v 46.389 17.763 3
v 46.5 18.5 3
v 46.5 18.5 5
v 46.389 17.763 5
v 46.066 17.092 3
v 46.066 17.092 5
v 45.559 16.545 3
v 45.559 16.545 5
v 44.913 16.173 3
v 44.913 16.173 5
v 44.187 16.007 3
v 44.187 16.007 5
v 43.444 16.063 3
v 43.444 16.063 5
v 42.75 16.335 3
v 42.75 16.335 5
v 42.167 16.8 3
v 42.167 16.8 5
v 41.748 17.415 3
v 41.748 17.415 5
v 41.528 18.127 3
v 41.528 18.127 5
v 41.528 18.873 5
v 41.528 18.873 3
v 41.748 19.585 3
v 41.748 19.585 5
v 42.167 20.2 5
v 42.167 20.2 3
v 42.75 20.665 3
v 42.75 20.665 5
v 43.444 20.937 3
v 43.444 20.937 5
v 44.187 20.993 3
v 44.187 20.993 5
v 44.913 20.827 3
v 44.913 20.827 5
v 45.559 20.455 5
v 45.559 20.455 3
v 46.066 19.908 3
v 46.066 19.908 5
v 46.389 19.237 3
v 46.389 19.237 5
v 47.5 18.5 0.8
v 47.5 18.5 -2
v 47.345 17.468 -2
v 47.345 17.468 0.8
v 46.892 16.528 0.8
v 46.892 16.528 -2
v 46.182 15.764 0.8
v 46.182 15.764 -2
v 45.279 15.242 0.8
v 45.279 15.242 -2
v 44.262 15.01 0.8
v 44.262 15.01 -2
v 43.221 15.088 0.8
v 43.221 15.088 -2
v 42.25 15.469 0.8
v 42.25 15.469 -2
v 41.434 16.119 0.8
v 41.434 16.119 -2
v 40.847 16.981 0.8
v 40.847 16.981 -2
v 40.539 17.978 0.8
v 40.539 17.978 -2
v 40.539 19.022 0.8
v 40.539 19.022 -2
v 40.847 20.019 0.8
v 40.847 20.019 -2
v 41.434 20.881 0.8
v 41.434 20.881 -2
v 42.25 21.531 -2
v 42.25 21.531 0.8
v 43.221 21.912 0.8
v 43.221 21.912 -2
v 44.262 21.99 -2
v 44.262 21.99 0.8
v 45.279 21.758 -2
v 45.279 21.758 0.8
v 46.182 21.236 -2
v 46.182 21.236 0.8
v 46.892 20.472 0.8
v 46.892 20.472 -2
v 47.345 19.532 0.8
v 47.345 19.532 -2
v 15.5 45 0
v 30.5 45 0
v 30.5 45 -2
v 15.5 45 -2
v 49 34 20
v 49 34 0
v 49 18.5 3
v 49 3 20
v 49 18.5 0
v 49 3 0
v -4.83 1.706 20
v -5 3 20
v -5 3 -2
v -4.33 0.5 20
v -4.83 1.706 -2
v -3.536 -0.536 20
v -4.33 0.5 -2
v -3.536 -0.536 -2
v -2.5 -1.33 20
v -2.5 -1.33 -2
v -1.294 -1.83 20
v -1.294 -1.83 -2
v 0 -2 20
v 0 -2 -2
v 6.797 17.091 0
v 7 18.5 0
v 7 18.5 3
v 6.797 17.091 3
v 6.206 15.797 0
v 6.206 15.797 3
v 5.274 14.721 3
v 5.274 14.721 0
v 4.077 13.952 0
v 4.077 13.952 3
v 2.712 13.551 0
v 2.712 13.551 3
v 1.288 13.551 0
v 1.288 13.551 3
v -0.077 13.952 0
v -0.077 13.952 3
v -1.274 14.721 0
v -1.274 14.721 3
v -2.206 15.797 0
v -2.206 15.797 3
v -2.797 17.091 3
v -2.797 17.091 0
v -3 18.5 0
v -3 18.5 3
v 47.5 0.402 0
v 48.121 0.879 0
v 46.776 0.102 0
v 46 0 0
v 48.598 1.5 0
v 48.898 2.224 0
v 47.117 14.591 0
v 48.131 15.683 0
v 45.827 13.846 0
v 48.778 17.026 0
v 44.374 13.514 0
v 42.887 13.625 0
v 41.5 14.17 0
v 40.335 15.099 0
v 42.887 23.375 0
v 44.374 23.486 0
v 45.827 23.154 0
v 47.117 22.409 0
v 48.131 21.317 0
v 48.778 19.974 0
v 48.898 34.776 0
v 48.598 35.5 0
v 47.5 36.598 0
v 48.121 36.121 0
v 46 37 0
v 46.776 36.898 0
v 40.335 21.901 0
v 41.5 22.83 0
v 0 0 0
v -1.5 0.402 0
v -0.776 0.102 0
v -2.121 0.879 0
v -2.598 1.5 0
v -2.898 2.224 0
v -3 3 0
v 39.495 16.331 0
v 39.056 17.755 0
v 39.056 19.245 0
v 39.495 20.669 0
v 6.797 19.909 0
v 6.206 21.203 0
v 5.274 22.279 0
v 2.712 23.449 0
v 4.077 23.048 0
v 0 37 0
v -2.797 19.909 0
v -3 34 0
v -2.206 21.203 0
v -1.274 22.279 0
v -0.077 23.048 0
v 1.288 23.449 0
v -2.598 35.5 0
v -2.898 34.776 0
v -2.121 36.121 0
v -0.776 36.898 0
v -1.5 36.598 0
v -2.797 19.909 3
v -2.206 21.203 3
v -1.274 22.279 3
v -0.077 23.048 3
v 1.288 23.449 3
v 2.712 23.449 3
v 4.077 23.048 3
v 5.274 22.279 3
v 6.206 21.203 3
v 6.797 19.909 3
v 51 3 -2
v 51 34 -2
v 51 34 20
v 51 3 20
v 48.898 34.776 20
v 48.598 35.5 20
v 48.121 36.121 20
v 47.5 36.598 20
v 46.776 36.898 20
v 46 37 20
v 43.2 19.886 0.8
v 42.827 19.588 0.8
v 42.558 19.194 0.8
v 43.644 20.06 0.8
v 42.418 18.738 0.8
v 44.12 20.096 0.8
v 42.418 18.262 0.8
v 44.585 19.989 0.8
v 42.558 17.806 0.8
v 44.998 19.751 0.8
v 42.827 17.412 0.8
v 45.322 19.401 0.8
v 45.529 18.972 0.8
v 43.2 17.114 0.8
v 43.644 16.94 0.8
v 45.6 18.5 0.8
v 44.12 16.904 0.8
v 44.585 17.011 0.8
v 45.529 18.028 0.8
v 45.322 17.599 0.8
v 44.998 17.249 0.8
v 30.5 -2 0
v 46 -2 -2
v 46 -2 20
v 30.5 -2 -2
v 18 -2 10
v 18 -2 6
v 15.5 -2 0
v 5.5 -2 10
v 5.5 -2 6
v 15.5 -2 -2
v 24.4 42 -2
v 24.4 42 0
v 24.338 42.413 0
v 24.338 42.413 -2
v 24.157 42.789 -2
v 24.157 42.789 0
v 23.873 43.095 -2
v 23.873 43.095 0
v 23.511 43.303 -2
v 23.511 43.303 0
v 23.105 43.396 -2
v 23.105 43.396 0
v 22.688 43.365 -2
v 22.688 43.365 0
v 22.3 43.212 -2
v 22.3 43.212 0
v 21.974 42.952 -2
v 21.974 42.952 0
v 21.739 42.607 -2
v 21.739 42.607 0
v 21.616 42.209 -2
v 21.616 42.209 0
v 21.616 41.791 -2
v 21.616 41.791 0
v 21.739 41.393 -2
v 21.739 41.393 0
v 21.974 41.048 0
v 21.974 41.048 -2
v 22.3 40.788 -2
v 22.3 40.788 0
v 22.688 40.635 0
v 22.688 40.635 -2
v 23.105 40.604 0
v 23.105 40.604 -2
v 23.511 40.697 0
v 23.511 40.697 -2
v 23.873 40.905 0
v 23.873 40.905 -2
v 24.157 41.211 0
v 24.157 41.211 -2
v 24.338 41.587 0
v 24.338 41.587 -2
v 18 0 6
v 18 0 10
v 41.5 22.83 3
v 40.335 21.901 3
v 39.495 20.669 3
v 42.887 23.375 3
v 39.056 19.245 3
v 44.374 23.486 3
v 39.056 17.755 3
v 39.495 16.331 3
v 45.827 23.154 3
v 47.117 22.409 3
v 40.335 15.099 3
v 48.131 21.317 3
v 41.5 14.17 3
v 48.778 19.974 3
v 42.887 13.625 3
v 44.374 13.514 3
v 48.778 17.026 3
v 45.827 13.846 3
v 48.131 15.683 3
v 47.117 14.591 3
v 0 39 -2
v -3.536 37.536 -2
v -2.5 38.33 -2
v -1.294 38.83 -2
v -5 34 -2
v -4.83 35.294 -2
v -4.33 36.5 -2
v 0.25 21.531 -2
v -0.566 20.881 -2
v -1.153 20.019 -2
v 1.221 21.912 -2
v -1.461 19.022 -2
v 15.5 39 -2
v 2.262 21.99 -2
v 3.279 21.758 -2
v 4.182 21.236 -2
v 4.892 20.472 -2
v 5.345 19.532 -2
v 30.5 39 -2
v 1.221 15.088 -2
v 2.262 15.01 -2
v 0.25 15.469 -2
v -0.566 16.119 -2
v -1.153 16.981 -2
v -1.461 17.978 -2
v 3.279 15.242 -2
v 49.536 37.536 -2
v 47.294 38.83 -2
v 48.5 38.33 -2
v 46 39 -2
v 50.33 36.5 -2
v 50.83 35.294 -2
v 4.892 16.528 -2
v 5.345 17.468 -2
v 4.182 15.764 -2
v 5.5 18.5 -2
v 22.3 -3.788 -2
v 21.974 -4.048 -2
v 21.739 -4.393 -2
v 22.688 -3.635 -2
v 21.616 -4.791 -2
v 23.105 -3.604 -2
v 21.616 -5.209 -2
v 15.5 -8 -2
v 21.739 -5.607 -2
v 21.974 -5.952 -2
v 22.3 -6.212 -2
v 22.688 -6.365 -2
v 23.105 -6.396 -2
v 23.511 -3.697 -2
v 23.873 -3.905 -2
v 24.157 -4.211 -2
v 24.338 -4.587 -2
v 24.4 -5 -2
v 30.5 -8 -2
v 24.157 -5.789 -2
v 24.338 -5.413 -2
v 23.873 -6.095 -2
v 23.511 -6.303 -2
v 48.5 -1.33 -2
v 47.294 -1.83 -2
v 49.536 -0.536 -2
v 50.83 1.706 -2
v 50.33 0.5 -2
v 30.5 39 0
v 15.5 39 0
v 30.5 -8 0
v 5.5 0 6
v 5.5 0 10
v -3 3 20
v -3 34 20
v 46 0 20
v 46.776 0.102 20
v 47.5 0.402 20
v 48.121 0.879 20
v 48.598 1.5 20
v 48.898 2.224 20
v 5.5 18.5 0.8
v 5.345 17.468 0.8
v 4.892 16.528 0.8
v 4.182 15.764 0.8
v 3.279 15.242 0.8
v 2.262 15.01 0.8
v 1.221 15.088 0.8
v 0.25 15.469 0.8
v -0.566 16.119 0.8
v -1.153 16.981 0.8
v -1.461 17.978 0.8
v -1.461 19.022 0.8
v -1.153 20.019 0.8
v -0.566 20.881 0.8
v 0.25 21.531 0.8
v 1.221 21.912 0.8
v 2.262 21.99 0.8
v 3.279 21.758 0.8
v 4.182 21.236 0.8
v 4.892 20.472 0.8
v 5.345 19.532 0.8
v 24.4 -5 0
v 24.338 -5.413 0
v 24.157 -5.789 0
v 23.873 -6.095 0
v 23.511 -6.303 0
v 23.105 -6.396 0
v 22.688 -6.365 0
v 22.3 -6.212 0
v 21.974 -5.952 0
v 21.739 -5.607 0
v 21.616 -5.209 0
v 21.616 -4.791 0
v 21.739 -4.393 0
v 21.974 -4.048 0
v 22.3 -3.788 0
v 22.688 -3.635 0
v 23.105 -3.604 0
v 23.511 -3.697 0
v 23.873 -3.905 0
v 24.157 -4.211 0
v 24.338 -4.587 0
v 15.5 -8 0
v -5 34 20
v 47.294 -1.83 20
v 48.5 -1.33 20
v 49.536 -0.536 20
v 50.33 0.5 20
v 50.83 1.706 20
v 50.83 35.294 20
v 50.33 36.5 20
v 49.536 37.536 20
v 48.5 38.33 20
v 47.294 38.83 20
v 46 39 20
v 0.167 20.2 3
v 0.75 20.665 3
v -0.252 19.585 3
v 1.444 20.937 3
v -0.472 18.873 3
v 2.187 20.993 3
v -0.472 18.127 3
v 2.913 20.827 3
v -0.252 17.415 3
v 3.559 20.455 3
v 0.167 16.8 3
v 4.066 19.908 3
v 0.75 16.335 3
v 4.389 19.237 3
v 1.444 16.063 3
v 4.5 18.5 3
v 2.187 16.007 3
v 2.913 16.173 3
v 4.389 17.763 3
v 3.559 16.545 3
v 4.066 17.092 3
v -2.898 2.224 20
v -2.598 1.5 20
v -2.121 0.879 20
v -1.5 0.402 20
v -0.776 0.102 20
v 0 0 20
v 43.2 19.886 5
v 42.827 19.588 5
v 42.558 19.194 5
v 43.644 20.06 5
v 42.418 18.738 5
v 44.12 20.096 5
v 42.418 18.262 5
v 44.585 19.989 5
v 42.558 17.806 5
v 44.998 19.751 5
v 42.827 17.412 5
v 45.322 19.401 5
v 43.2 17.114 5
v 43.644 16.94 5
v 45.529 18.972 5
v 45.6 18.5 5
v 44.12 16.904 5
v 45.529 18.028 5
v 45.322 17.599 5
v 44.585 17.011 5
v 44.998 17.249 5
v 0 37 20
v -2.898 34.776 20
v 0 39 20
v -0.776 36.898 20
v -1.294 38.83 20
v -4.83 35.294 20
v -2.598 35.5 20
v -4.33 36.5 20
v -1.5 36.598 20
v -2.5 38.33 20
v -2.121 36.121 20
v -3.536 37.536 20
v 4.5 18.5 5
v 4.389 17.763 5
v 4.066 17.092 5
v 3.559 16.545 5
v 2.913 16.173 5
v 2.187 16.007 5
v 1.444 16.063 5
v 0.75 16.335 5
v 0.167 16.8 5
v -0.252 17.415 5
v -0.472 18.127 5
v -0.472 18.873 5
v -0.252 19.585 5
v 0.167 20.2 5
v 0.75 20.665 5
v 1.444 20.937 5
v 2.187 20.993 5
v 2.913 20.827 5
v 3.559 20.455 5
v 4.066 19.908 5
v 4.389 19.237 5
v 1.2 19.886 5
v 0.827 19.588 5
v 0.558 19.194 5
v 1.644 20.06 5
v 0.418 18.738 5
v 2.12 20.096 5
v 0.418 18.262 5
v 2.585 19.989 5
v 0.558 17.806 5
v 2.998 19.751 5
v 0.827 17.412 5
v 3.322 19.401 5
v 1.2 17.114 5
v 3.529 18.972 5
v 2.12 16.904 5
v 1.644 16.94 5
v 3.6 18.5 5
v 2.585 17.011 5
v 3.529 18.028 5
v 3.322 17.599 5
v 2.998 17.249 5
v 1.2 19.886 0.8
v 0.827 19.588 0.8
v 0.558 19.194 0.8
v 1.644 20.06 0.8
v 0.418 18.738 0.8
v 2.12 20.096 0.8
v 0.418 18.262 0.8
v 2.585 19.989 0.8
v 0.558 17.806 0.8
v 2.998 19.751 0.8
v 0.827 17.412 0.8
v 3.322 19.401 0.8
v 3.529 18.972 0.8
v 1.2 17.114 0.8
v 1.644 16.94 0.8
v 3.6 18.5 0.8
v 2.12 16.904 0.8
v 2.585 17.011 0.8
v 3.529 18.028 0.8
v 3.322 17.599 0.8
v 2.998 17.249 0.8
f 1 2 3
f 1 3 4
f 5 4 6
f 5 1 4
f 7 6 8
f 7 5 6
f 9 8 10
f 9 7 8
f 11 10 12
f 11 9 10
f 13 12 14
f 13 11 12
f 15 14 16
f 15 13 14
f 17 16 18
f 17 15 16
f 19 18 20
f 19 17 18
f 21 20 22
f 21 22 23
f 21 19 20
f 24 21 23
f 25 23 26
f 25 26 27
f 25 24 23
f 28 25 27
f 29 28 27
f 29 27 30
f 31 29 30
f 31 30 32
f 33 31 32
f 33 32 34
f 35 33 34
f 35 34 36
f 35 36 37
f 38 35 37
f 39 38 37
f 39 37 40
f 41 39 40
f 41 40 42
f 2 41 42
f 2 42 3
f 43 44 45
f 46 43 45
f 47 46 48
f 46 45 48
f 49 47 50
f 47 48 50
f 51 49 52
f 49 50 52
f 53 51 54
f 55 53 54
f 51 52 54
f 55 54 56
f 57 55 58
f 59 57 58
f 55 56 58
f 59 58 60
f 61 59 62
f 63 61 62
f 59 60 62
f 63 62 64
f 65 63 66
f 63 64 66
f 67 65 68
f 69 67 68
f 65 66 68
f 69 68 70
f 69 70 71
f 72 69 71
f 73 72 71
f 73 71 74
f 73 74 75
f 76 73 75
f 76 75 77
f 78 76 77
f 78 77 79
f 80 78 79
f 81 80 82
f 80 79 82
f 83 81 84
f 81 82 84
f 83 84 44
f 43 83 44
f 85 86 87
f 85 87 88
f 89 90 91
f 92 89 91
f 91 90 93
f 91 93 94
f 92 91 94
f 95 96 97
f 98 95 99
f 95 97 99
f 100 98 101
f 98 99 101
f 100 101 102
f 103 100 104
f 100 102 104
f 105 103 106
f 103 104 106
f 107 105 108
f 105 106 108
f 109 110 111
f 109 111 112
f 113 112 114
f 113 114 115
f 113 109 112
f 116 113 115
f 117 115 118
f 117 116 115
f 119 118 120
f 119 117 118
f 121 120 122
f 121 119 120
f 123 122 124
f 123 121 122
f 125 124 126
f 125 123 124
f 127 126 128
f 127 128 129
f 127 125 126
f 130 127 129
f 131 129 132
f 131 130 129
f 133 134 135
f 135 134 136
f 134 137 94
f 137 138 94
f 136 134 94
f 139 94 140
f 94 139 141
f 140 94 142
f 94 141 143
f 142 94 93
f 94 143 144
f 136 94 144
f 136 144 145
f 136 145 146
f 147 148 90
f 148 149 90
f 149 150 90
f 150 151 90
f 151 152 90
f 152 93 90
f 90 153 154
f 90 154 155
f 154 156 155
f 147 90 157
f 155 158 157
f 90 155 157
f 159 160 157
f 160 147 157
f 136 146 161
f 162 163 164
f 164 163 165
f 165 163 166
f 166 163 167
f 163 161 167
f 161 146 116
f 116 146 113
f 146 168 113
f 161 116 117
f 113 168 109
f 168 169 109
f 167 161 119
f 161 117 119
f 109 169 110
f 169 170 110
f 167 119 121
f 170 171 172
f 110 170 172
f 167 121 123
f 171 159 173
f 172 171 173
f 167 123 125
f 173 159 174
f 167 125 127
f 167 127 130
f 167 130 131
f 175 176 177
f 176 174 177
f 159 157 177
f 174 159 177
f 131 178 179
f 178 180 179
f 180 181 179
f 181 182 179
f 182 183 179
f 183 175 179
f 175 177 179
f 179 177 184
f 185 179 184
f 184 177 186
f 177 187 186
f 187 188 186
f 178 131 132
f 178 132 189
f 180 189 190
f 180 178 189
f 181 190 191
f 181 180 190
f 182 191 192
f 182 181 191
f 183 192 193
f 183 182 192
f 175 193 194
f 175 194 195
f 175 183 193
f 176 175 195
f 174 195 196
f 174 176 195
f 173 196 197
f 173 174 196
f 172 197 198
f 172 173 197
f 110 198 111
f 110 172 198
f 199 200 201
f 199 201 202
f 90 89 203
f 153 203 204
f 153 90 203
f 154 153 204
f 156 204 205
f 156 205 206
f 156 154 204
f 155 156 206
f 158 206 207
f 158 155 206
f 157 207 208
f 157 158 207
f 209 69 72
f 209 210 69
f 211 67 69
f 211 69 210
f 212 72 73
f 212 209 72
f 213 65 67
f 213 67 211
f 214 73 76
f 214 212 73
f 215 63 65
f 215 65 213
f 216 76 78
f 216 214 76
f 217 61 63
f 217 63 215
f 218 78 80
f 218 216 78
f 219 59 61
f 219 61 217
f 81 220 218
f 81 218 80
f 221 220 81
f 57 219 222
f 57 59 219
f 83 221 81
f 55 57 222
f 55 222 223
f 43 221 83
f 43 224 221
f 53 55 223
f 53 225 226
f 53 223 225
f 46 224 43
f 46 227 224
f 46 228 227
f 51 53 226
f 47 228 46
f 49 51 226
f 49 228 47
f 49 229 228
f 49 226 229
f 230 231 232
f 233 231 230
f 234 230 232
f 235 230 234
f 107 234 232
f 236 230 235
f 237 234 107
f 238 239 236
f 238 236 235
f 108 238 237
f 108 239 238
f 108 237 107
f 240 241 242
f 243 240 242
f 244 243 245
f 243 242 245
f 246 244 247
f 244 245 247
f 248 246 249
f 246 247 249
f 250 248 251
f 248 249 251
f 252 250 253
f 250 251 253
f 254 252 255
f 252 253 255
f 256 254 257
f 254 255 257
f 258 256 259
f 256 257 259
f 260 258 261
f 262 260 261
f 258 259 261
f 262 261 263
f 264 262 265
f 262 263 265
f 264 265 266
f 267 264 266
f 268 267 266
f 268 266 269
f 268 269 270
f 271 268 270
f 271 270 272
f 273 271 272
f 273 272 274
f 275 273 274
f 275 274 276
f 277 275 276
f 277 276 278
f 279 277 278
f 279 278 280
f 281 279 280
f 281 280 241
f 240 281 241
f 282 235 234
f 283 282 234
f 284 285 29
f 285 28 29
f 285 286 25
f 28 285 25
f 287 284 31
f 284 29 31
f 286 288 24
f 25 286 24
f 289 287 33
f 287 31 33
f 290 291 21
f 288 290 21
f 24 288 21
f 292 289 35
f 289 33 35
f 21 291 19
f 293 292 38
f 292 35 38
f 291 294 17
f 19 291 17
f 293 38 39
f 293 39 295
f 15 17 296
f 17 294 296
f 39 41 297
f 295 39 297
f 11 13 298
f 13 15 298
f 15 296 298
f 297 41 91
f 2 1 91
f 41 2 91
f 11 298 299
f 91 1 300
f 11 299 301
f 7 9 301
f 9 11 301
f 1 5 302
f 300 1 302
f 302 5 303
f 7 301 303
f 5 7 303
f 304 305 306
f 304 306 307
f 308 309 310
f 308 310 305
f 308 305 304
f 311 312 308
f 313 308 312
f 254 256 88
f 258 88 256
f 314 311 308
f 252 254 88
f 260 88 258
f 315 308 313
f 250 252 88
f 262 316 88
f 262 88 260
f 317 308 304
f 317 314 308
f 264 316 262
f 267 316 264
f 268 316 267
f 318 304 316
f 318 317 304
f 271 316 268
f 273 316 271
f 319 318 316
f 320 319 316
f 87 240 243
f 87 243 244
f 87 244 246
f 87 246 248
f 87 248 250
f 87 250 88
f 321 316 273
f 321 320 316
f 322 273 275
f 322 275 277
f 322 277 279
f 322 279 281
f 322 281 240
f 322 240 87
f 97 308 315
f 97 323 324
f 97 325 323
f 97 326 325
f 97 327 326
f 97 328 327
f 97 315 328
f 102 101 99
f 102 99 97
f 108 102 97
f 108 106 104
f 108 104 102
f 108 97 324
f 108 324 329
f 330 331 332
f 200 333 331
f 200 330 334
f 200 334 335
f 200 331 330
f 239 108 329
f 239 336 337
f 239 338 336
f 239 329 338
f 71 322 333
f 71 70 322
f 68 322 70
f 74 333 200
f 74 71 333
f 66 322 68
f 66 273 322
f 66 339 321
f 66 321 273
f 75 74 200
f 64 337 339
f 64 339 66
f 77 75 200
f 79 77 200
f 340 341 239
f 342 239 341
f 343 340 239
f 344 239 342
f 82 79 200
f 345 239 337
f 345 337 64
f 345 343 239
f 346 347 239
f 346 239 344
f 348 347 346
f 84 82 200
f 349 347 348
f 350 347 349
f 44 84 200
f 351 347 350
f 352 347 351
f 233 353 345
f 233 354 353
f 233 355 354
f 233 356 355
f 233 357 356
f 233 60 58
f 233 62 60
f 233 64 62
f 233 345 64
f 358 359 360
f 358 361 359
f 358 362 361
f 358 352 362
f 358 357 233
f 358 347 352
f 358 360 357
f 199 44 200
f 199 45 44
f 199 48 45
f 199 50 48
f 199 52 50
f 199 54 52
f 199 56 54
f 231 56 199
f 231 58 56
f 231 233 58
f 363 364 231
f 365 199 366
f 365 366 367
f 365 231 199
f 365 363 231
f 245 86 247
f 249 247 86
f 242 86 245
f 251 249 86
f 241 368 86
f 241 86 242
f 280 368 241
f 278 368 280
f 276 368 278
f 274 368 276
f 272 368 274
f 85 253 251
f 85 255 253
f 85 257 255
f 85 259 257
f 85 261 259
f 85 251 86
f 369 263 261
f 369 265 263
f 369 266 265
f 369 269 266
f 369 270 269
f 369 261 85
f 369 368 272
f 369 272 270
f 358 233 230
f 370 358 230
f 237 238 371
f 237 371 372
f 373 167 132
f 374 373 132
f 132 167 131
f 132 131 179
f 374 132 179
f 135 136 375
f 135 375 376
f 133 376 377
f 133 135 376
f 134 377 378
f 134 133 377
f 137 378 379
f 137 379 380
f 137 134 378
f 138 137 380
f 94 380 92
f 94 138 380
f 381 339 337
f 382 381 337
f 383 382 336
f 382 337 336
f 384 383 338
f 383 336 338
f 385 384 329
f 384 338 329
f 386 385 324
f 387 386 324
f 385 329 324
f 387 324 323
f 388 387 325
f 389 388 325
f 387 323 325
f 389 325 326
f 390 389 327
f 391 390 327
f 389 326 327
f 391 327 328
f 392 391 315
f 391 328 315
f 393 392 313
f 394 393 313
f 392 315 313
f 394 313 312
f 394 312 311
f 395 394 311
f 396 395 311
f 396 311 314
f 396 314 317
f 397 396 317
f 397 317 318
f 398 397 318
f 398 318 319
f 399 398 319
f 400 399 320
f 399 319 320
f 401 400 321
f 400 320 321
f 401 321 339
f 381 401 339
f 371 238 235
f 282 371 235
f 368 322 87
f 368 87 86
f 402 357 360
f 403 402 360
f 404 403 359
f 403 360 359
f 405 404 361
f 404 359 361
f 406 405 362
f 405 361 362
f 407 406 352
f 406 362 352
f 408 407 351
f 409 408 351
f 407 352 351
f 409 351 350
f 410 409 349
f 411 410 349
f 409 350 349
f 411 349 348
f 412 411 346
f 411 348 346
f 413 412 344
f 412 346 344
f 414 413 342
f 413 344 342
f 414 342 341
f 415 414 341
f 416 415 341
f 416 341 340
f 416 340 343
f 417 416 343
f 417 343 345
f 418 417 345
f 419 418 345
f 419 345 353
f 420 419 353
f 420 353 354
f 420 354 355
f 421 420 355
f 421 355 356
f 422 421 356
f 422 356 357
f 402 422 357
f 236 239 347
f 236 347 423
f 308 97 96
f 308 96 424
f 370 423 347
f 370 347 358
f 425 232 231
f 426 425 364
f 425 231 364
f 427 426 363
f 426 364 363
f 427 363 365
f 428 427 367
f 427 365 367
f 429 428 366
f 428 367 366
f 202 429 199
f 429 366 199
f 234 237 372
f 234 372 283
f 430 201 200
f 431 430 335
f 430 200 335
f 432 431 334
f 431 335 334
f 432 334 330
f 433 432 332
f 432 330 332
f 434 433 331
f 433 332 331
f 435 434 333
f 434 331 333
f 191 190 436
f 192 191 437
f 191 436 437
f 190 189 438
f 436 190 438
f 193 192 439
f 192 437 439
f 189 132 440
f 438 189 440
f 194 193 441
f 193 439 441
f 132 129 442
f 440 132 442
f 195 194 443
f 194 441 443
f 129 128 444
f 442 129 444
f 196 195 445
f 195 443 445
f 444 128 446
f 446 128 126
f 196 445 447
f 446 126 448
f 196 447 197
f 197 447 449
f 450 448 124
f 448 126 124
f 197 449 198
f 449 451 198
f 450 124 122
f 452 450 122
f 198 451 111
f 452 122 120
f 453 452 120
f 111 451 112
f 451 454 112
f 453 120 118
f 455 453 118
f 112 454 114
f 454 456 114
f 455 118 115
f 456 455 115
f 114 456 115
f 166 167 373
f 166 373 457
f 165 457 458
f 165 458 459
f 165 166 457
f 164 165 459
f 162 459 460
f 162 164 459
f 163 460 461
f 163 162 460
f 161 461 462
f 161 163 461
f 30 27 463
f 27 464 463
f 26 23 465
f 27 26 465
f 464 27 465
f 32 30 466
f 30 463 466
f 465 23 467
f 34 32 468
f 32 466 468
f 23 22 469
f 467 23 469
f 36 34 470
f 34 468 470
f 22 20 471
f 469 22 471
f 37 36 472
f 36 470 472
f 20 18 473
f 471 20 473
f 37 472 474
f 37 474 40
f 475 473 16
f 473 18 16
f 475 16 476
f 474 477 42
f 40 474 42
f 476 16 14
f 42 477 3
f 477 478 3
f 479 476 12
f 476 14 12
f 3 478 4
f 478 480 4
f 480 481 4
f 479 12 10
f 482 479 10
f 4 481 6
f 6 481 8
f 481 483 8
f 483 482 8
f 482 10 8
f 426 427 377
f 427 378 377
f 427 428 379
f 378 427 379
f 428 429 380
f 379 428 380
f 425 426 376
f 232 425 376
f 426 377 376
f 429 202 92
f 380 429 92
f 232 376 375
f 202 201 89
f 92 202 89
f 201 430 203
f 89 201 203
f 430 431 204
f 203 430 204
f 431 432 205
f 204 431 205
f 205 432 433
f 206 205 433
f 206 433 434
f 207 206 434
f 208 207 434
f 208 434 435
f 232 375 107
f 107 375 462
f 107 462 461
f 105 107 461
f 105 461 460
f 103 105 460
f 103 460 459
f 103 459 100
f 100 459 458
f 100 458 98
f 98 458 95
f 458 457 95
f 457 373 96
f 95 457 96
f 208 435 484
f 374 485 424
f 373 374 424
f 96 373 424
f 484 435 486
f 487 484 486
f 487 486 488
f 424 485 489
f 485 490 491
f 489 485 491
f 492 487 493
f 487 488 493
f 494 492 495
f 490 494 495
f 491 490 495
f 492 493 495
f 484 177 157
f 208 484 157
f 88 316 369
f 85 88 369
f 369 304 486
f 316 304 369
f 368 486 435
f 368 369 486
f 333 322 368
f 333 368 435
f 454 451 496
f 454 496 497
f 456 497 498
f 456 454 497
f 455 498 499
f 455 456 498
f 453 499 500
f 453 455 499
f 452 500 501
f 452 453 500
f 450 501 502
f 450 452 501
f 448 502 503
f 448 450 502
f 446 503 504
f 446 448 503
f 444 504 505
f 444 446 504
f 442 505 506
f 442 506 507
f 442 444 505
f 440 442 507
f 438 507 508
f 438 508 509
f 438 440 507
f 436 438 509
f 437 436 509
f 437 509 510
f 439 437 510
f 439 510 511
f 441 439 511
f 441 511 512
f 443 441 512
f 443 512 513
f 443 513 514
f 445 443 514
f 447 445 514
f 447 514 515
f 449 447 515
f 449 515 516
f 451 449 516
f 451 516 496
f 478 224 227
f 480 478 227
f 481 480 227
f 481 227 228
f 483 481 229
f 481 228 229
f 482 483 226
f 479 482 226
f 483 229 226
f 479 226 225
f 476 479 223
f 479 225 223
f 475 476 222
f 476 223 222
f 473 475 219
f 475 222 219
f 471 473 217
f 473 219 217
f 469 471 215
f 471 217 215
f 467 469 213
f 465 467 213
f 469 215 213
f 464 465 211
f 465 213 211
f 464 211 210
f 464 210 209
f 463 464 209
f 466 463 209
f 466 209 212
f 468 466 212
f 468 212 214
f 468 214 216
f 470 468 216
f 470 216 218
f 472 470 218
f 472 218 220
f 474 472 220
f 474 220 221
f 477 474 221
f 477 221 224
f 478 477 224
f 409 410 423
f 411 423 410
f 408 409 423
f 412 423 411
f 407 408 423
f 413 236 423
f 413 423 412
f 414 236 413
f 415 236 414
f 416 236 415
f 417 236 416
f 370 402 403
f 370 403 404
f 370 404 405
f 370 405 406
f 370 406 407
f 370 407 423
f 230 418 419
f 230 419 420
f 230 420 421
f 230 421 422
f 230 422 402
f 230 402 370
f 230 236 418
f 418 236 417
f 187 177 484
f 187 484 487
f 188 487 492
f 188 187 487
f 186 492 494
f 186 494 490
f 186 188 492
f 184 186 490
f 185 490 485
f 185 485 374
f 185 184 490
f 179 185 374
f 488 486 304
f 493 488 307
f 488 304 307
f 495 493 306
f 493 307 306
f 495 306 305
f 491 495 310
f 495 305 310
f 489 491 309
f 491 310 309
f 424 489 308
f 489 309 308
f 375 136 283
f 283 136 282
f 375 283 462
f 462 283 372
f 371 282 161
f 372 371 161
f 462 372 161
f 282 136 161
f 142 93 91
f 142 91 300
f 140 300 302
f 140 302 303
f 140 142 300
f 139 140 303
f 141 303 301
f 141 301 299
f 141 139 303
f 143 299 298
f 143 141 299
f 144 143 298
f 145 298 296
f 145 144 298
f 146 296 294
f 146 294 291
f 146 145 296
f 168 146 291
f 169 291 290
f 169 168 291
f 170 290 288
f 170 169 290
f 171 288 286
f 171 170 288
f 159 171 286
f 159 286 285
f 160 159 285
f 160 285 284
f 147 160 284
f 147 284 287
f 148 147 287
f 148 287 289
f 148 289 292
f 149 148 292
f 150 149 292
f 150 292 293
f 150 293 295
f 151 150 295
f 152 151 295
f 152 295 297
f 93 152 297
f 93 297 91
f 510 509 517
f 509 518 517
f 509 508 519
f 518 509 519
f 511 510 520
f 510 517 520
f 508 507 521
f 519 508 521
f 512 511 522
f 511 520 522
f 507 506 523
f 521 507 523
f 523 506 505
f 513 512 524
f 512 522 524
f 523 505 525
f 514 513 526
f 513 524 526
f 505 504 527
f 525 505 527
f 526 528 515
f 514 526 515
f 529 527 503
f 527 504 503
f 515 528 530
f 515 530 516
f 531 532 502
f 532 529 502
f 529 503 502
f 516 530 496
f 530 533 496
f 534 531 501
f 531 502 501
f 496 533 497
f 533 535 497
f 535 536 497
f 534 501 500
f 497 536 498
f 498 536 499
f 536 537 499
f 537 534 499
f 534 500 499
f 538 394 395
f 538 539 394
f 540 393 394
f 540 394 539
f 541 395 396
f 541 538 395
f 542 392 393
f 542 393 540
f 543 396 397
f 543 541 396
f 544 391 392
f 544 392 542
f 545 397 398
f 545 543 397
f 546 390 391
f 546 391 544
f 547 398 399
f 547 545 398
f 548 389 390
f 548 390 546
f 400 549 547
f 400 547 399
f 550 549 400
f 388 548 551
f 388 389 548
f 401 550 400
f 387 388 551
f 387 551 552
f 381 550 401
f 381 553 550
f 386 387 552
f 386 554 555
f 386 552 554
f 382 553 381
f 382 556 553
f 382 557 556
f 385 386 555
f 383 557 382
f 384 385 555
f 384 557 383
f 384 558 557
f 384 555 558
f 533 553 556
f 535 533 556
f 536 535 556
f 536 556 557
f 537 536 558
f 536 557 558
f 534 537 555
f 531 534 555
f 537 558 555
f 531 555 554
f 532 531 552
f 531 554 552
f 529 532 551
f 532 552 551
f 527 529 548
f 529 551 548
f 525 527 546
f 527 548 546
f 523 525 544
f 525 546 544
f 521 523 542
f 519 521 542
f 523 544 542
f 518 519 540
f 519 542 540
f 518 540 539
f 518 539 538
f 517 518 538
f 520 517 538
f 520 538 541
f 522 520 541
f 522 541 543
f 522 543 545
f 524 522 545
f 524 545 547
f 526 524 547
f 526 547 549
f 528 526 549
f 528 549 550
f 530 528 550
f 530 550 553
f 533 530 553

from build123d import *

# Parameters (mm, degrees)
PAD_DEPTH       = 20
THICKNESS_T     = 2
SKETCH001_W     = 15
SKETCH001_H     = 2
PAD001_DEPTH    = 6
SKETCH002_R     = 1.4
POCKET_DEPTH    = 2.001
SKETCH003_W     = 15
SKETCH003_H     = 2
PAD002_DEPTH    = 6
SKETCH004_R     = 1.4
POCKET001_DEPTH = 22.001
SKETCH005_R     = 2.5
PAD003_DEPTH    = 7
SKETCH006_R     = 5
PAD004_DEPTH    = 5
SKETCH007_R     = 1.6
POCKET002_DEPTH = 22.001
SKETCH008_R     = 3.5
POCKET003_DEPTH = 2.8
SKETCH009_W     = 12.5
SKETCH009_H     = 4
POCKET004_DEPTH = 2


with BuildPart() as part:
    # Sketch → Pad (new body)
    with BuildSketch(Plane.XY):
        with BuildLine():
            Line((0, 37), (46, 37))
            ThreePointArc((49, 34), (48.1213203436, 36.1213203436), (46, 37))
            Line((49, 34), (49, 3))
            ThreePointArc((46, 0), (48.1213203436, 0.8786796564), (49, 3))
            Line((46, 0), (0, 0))
            ThreePointArc((-3, 3), (-2.1213203436, 0.8786796564), (0, 0))
            Line((-3, 3), (-3, 34))
            ThreePointArc((0, 37), (-2.1213203436, 36.1213203436), (-3, 34))
        make_face()
    extrude(amount=PAD_DEPTH)

    # Thickness
    thickness_openings = [part.faces().sort_by_distance(p)[0] for p in [
        (23, 18.5, 20),
    ]]
    offset(amount=THICKNESS_T, openings=thickness_openings, kind=Kind.INTERSECTION)

    # Sketch001 → Pad001 (new body)
    with BuildSketch(Plane(origin=(0, 39, 0), x_dir=(-1, 0, 0), z_dir=(0, 1, 0))):
        with Locations((-23, -1)):
            Rectangle(SKETCH001_W, SKETCH001_H)
    extrude(amount=PAD001_DEPTH)

    # Sketch002 → Pocket (cut, through all)
    with BuildSketch(Plane.XY):
        with Locations((23, 42)):
            Circle(SKETCH002_R)
    extrude(amount=-POCKET_DEPTH, mode=Mode.SUBTRACT)

    # Sketch003 → Pad002 (new body)
    with BuildSketch(Plane.XZ.offset(2)):
        with Locations((23, -1)):
            Rectangle(SKETCH003_W, SKETCH003_H)
    extrude(amount=PAD002_DEPTH)

    # Sketch004 → Pocket001 (cut, through all)
    with BuildSketch(Plane(origin=(0, 0, -2), x_dir=(1, 0, 0), z_dir=(0, 0, -1))):
        with Locations((23, 5)):
            Circle(SKETCH004_R)
    extrude(amount=-POCKET001_DEPTH, mode=Mode.SUBTRACT)

    # Sketch005 → Pad003 (new body)
    with BuildSketch(Plane(origin=(0, 0, -2), x_dir=(1, 0, 0), z_dir=(0, 0, -1))):
        with Locations((2, -18.5)):
            Circle(SKETCH005_R)
        with Locations((44, -18.5)):
            Circle(SKETCH005_R)
    extrude(amount=-PAD003_DEPTH)

    # Sketch006 → Pad004 (new body)
    with BuildSketch(Plane(origin=(0, 0, -2), x_dir=(1, 0, 0), z_dir=(0, 0, -1))):
        with Locations((2, -18.5)):
            Circle(SKETCH006_R)
        with Locations((44, -18.5)):
            Circle(SKETCH006_R)
    extrude(amount=-PAD004_DEPTH)

    # Sketch007 → Pocket002 (cut, through all)
    with BuildSketch(Plane(origin=(0, 0, -2), x_dir=(1, 0, 0), z_dir=(0, 0, -1))):
        with Locations((2, -18.5)):
            Circle(SKETCH007_R)
        with Locations((44, -18.5)):
            Circle(SKETCH007_R)
    extrude(amount=-POCKET002_DEPTH, mode=Mode.SUBTRACT)

    # Sketch008 → Pocket003 (cut)
    with BuildSketch(Plane(origin=(0, 0, -2), x_dir=(1, 0, 0), z_dir=(0, 0, -1))):
        with Locations((2, -18.5)):
            Circle(SKETCH008_R)
        with Locations((44, -18.5)):
            Circle(SKETCH008_R)
    extrude(amount=-POCKET003_DEPTH, mode=Mode.SUBTRACT)

    # Sketch009 → Pocket004 (cut)
    with BuildSketch(Plane.XZ.offset(2)):
        with Locations((11.75, 8)):
            Rectangle(SKETCH009_W, SKETCH009_H)
    extrude(amount=-POCKET004_DEPTH, mode=Mode.SUBTRACT)


solid = part.part
